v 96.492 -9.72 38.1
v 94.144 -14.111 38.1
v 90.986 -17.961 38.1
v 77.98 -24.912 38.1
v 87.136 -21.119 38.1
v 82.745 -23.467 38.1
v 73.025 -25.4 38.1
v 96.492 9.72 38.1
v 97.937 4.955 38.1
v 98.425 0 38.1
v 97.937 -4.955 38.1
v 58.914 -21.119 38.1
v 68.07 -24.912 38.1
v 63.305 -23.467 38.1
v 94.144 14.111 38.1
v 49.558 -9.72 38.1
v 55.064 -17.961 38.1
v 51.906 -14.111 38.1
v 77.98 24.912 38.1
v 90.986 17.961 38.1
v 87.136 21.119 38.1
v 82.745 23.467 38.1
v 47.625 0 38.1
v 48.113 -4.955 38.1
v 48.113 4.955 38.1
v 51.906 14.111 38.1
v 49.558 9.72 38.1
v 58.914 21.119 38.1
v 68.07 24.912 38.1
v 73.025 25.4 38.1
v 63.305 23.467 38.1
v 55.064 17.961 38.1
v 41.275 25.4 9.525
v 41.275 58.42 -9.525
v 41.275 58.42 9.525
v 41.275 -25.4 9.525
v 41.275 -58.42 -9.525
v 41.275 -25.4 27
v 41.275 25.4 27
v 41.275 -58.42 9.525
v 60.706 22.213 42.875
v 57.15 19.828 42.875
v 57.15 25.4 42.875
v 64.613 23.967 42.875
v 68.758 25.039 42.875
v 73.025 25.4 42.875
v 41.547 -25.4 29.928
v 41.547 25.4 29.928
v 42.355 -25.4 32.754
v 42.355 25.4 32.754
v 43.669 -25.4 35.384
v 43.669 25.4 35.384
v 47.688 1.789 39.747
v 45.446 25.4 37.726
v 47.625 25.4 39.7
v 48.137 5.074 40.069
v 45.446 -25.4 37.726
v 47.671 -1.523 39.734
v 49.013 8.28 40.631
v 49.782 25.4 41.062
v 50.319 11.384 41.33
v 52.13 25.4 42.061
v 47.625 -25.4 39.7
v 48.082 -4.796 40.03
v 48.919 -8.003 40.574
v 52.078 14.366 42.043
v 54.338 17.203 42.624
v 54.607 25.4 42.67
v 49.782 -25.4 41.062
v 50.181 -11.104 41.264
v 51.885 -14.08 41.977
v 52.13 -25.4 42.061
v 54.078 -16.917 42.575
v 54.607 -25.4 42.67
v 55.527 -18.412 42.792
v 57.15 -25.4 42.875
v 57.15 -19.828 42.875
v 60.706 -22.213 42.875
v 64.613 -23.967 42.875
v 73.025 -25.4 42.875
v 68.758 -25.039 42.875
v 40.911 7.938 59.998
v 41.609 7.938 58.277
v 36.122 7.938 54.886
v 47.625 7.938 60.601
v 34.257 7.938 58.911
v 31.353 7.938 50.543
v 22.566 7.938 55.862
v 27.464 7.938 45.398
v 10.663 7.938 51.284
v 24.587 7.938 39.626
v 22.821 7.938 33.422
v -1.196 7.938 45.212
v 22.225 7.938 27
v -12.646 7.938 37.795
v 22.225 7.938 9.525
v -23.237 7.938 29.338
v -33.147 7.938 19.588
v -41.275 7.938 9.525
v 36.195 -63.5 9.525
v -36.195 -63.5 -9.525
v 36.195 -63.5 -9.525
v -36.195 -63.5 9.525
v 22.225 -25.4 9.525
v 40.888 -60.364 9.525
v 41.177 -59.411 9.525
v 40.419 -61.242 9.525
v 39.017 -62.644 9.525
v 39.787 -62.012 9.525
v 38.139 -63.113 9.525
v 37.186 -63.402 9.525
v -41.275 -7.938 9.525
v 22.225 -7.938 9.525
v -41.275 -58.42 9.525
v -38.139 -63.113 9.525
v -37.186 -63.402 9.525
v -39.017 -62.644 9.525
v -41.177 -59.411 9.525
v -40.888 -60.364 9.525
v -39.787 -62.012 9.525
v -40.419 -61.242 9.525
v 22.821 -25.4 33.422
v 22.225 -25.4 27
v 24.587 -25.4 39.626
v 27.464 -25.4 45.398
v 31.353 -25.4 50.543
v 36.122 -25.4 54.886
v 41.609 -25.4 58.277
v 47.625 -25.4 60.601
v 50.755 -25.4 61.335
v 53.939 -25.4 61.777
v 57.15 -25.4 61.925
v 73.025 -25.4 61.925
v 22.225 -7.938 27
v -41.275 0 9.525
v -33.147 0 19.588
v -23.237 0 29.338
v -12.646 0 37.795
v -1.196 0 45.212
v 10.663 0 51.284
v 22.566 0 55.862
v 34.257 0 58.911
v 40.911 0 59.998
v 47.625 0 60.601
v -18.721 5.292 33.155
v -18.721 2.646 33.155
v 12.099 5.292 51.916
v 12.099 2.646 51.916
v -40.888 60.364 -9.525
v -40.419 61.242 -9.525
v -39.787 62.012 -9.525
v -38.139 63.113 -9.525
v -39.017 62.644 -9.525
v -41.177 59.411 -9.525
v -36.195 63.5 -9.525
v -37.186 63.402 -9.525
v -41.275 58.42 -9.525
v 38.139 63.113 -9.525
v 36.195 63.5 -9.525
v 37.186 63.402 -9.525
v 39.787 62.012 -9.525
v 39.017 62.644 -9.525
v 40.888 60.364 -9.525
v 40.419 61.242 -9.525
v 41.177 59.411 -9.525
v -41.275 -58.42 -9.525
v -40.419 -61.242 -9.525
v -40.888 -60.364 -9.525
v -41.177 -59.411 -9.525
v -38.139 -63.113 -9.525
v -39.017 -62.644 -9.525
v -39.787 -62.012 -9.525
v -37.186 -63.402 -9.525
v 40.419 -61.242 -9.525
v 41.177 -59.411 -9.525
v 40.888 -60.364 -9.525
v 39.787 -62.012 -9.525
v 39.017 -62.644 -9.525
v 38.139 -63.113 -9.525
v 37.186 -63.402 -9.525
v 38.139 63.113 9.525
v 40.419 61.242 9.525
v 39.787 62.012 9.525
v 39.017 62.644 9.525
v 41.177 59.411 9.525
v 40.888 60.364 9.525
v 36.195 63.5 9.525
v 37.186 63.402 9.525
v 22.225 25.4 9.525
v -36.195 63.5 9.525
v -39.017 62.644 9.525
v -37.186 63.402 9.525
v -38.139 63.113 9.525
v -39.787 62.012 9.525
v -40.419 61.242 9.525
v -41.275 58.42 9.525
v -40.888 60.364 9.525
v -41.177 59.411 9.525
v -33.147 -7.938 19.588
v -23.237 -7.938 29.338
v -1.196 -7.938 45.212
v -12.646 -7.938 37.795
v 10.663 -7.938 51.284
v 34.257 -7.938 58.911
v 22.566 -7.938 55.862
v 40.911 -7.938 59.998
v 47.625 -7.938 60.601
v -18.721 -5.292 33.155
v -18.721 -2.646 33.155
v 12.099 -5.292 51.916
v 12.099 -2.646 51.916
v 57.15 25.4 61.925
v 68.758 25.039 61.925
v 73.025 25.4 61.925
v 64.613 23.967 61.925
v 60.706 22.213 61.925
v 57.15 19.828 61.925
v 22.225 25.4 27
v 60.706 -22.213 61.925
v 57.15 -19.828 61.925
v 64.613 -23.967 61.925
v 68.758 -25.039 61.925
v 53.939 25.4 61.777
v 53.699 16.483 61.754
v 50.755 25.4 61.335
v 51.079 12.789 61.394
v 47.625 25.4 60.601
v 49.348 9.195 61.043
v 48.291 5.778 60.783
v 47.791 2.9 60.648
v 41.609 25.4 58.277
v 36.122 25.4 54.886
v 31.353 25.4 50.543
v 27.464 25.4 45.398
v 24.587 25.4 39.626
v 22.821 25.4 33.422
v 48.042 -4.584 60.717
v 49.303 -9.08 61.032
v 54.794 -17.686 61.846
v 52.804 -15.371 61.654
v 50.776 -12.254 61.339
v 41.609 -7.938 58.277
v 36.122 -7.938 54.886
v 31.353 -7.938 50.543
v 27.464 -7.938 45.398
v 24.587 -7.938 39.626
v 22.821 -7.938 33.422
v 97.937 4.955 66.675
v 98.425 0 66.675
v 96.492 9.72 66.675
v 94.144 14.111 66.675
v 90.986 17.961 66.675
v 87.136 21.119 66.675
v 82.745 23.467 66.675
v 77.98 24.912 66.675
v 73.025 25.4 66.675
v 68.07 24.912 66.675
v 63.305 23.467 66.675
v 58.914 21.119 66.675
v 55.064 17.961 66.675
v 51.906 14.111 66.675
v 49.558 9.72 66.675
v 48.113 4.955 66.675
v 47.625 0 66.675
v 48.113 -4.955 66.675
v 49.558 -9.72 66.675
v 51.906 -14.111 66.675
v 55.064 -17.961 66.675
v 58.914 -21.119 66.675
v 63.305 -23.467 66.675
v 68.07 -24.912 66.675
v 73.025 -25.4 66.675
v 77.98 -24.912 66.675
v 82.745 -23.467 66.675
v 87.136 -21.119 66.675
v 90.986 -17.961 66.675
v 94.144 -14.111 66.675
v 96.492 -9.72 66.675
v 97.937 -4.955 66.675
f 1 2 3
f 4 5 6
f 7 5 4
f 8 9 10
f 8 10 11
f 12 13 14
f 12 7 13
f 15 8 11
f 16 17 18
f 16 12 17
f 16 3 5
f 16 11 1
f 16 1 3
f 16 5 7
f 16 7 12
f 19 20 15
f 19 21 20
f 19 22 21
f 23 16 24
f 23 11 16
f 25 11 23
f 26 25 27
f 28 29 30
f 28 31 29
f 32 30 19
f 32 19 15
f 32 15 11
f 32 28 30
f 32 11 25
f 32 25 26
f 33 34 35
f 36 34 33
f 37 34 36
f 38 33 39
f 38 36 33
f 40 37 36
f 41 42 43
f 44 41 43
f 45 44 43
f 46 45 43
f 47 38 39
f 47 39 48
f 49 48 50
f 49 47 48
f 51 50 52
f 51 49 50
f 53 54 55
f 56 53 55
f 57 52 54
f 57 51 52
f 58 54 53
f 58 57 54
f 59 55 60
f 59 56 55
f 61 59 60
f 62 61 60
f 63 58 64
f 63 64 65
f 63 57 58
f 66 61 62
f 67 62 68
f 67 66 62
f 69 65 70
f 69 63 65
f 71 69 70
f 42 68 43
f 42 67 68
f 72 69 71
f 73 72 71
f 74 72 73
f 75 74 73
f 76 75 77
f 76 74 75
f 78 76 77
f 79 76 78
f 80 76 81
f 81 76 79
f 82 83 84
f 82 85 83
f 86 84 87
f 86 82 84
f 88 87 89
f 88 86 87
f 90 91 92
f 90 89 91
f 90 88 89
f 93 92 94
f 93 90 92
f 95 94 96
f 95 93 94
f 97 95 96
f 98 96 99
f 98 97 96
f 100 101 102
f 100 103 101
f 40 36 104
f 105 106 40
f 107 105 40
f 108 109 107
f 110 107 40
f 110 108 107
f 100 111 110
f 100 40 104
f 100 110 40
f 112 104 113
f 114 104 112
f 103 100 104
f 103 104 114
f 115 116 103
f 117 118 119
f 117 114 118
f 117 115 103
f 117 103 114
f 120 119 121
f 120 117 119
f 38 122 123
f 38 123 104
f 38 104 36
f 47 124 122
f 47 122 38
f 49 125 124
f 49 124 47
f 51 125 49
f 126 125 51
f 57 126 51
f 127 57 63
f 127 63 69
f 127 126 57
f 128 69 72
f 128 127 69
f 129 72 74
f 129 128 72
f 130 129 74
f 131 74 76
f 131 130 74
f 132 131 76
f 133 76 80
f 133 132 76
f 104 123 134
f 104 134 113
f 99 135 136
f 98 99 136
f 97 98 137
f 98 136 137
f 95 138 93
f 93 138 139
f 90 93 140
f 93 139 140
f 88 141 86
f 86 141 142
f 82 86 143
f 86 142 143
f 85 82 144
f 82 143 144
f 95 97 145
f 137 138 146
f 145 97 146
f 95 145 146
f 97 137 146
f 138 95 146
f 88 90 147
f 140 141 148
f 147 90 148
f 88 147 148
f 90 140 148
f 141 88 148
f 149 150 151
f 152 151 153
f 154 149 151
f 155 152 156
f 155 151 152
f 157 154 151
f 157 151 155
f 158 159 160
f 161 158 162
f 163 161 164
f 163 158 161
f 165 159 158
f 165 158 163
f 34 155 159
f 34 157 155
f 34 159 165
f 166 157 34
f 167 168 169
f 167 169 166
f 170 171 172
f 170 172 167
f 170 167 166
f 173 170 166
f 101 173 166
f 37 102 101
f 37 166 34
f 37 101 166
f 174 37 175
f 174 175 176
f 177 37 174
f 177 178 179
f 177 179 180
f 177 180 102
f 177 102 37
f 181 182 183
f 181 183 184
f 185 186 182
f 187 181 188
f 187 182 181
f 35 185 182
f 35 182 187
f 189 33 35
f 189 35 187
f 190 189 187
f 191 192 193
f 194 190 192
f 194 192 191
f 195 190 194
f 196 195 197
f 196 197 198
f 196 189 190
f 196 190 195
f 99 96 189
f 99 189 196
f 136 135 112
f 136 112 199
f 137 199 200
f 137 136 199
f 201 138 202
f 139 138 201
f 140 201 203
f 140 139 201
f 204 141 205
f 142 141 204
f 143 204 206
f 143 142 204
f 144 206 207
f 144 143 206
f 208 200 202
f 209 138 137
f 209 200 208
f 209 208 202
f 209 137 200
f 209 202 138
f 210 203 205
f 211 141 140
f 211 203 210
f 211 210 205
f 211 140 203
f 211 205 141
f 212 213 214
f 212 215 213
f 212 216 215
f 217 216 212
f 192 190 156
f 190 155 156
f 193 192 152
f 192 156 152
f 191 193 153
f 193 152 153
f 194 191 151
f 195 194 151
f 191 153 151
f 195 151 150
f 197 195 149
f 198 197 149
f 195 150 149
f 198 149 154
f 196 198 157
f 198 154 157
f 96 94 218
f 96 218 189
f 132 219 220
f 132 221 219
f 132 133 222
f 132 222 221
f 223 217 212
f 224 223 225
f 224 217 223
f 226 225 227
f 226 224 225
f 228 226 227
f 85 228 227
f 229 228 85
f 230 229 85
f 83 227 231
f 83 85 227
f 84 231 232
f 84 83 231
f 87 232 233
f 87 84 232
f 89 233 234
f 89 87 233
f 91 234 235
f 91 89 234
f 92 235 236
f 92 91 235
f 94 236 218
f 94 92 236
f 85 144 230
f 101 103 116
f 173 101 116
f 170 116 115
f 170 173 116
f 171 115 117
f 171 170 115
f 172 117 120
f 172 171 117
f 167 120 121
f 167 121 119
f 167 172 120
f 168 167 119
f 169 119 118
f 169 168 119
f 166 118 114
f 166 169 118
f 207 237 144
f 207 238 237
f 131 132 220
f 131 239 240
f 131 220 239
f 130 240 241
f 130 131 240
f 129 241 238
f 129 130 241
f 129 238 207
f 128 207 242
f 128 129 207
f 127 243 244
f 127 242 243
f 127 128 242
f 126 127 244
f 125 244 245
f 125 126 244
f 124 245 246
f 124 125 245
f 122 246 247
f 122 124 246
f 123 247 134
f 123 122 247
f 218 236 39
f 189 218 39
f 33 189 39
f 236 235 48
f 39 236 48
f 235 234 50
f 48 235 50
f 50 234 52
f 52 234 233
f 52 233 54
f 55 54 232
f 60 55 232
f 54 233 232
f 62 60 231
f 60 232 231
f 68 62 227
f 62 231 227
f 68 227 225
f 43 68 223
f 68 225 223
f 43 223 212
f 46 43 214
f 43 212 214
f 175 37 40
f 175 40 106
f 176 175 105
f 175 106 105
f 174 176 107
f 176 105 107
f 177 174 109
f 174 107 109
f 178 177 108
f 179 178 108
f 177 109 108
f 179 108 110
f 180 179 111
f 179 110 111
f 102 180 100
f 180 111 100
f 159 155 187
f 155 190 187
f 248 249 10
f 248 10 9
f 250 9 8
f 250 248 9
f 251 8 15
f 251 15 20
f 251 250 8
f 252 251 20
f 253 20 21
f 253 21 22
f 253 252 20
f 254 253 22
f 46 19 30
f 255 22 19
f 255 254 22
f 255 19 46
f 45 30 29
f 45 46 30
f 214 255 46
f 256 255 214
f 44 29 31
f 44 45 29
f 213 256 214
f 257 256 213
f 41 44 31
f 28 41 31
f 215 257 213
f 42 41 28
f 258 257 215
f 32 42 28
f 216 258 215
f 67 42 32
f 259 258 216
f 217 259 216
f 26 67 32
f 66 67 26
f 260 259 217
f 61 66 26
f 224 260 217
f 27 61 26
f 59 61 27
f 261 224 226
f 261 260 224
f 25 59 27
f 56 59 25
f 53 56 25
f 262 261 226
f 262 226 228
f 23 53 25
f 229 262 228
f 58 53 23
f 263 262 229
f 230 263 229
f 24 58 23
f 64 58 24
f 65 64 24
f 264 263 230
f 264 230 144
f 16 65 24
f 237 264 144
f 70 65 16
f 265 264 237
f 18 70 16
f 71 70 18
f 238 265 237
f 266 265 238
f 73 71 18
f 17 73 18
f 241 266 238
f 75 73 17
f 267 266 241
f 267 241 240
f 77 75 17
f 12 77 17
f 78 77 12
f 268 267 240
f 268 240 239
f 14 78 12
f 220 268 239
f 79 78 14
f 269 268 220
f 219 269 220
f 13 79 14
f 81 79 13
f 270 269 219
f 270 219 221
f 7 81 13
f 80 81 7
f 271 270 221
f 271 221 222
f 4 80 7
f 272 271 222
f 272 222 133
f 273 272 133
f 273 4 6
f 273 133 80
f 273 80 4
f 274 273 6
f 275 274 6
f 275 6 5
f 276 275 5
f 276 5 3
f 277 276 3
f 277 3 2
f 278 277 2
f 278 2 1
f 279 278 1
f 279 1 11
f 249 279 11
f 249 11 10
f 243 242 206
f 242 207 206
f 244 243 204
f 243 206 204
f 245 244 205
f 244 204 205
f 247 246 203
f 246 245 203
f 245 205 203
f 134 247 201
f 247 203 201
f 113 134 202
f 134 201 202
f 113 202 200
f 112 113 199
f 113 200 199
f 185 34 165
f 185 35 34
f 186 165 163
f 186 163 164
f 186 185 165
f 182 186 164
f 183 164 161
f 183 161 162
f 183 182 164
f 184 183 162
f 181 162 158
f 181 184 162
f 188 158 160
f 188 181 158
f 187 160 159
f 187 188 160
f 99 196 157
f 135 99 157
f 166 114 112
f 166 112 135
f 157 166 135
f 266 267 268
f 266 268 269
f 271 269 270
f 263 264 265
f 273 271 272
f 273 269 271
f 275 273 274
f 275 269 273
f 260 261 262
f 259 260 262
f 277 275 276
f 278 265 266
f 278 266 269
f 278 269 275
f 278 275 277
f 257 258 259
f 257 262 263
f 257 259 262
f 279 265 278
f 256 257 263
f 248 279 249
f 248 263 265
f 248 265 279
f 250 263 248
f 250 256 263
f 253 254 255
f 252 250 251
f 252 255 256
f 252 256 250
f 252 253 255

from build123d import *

# Parameters (mm, degrees)
F1_DEPTH = 63.5
F2_DEPTH = 25.4
F3_DEPTH = 7.9375
F5_R     = 5.08


with BuildPart() as f1:
    # F0 (on Front) → F1 (new body, symmetric)
    with BuildSketch(Plane.XZ):
        Polygon((-41.275, -9.525), (41.275, -9.525), (41.275, 9.525), (22.225, 9.525), (-41.275, 9.525), align=None)
    extrude(amount=F1_DEPTH, both=True)

    # F0 (on Front) → F2 (join, symmetric)
    with BuildSketch(Plane.XZ):
        with BuildLine():
            ThreePointArc((57.15, 61.9252), (52.3417131244, 61.5926269504), (47.625, 60.6012416505))
            Line((47.625, 60.6012416505), (47.625, 39.7002))
            ThreePointArc((47.625, 39.7002), (52.1298842145, 42.0605473566), (57.15, 42.8752))
            Line((57.15, 42.8752), (73.025, 42.8752))
            Line((73.025, 42.8752), (73.025, 61.9252))
            Line((73.025, 61.9252), (57.15, 61.9252))
        make_face()
        with BuildLine():
            Line((22.225, 9.525), (41.275, 9.525))
            Line((41.275, 9.525), (41.275, 27.0002))
            ThreePointArc((41.275, 27.0002), (42.9509683429, 34.0997158286), (47.625, 39.7002))
            Line((47.625, 39.7002), (47.625, 60.6012416505))
            ThreePointArc((47.625, 60.6012416505), (29.28948807, 48.0607674188), (22.225, 27.0002))
            Line((22.225, 27.0002), (22.225, 9.525))
        make_face()
    extrude(amount=F2_DEPTH, both=True)

    # F0 (on Front) → F3 (join, symmetric)
    with BuildSketch(Plane.XZ):
        with BuildLine():
            add(Edge.make_bspline(
                [(-41.275, 9.525), (-24.0416502966, 33.8548284783), (10.9341804068, 58.6884807018), (47.625, 60.6012416505)],
                knots=[0, 0, 0, 0, 102.5280081789, 102.5280081789, 102.5280081789, 102.5280081789], degree=3))
            Line((-41.275, 9.525), (22.225, 9.525))
            Line((22.225, 9.525), (22.225, 27.0002))
            ThreePointArc((22.225, 27.0002), (29.28948807, 48.0607674188), (47.625, 60.6012416505))
        make_face()
    extrude(amount=F3_DEPTH, both=True)

    # F0 (on Front) → F4 (revolve)
    with BuildSketch(Plane.XZ):
        Polygon((98.425, 66.675), (73.025, 66.675), (73.025, 61.9252), (73.025, 42.8752), (73.025, 38.1), (98.425, 38.1), align=None)
    revolve(axis=Axis((73.025, 0, 52.3875), (0, 0, 1)))

    # F5
    f5_edges = [f1.edges().sort_by_distance(p)[0] for p in [
        (-41.275, -63.5, 0),
        (-41.275, 63.5, 0),
        (41.275, 63.5, 0),
        (41.275, -63.5, 0),
    ]]
    fillet(f5_edges, radius=F5_R)


solid = f1.part
